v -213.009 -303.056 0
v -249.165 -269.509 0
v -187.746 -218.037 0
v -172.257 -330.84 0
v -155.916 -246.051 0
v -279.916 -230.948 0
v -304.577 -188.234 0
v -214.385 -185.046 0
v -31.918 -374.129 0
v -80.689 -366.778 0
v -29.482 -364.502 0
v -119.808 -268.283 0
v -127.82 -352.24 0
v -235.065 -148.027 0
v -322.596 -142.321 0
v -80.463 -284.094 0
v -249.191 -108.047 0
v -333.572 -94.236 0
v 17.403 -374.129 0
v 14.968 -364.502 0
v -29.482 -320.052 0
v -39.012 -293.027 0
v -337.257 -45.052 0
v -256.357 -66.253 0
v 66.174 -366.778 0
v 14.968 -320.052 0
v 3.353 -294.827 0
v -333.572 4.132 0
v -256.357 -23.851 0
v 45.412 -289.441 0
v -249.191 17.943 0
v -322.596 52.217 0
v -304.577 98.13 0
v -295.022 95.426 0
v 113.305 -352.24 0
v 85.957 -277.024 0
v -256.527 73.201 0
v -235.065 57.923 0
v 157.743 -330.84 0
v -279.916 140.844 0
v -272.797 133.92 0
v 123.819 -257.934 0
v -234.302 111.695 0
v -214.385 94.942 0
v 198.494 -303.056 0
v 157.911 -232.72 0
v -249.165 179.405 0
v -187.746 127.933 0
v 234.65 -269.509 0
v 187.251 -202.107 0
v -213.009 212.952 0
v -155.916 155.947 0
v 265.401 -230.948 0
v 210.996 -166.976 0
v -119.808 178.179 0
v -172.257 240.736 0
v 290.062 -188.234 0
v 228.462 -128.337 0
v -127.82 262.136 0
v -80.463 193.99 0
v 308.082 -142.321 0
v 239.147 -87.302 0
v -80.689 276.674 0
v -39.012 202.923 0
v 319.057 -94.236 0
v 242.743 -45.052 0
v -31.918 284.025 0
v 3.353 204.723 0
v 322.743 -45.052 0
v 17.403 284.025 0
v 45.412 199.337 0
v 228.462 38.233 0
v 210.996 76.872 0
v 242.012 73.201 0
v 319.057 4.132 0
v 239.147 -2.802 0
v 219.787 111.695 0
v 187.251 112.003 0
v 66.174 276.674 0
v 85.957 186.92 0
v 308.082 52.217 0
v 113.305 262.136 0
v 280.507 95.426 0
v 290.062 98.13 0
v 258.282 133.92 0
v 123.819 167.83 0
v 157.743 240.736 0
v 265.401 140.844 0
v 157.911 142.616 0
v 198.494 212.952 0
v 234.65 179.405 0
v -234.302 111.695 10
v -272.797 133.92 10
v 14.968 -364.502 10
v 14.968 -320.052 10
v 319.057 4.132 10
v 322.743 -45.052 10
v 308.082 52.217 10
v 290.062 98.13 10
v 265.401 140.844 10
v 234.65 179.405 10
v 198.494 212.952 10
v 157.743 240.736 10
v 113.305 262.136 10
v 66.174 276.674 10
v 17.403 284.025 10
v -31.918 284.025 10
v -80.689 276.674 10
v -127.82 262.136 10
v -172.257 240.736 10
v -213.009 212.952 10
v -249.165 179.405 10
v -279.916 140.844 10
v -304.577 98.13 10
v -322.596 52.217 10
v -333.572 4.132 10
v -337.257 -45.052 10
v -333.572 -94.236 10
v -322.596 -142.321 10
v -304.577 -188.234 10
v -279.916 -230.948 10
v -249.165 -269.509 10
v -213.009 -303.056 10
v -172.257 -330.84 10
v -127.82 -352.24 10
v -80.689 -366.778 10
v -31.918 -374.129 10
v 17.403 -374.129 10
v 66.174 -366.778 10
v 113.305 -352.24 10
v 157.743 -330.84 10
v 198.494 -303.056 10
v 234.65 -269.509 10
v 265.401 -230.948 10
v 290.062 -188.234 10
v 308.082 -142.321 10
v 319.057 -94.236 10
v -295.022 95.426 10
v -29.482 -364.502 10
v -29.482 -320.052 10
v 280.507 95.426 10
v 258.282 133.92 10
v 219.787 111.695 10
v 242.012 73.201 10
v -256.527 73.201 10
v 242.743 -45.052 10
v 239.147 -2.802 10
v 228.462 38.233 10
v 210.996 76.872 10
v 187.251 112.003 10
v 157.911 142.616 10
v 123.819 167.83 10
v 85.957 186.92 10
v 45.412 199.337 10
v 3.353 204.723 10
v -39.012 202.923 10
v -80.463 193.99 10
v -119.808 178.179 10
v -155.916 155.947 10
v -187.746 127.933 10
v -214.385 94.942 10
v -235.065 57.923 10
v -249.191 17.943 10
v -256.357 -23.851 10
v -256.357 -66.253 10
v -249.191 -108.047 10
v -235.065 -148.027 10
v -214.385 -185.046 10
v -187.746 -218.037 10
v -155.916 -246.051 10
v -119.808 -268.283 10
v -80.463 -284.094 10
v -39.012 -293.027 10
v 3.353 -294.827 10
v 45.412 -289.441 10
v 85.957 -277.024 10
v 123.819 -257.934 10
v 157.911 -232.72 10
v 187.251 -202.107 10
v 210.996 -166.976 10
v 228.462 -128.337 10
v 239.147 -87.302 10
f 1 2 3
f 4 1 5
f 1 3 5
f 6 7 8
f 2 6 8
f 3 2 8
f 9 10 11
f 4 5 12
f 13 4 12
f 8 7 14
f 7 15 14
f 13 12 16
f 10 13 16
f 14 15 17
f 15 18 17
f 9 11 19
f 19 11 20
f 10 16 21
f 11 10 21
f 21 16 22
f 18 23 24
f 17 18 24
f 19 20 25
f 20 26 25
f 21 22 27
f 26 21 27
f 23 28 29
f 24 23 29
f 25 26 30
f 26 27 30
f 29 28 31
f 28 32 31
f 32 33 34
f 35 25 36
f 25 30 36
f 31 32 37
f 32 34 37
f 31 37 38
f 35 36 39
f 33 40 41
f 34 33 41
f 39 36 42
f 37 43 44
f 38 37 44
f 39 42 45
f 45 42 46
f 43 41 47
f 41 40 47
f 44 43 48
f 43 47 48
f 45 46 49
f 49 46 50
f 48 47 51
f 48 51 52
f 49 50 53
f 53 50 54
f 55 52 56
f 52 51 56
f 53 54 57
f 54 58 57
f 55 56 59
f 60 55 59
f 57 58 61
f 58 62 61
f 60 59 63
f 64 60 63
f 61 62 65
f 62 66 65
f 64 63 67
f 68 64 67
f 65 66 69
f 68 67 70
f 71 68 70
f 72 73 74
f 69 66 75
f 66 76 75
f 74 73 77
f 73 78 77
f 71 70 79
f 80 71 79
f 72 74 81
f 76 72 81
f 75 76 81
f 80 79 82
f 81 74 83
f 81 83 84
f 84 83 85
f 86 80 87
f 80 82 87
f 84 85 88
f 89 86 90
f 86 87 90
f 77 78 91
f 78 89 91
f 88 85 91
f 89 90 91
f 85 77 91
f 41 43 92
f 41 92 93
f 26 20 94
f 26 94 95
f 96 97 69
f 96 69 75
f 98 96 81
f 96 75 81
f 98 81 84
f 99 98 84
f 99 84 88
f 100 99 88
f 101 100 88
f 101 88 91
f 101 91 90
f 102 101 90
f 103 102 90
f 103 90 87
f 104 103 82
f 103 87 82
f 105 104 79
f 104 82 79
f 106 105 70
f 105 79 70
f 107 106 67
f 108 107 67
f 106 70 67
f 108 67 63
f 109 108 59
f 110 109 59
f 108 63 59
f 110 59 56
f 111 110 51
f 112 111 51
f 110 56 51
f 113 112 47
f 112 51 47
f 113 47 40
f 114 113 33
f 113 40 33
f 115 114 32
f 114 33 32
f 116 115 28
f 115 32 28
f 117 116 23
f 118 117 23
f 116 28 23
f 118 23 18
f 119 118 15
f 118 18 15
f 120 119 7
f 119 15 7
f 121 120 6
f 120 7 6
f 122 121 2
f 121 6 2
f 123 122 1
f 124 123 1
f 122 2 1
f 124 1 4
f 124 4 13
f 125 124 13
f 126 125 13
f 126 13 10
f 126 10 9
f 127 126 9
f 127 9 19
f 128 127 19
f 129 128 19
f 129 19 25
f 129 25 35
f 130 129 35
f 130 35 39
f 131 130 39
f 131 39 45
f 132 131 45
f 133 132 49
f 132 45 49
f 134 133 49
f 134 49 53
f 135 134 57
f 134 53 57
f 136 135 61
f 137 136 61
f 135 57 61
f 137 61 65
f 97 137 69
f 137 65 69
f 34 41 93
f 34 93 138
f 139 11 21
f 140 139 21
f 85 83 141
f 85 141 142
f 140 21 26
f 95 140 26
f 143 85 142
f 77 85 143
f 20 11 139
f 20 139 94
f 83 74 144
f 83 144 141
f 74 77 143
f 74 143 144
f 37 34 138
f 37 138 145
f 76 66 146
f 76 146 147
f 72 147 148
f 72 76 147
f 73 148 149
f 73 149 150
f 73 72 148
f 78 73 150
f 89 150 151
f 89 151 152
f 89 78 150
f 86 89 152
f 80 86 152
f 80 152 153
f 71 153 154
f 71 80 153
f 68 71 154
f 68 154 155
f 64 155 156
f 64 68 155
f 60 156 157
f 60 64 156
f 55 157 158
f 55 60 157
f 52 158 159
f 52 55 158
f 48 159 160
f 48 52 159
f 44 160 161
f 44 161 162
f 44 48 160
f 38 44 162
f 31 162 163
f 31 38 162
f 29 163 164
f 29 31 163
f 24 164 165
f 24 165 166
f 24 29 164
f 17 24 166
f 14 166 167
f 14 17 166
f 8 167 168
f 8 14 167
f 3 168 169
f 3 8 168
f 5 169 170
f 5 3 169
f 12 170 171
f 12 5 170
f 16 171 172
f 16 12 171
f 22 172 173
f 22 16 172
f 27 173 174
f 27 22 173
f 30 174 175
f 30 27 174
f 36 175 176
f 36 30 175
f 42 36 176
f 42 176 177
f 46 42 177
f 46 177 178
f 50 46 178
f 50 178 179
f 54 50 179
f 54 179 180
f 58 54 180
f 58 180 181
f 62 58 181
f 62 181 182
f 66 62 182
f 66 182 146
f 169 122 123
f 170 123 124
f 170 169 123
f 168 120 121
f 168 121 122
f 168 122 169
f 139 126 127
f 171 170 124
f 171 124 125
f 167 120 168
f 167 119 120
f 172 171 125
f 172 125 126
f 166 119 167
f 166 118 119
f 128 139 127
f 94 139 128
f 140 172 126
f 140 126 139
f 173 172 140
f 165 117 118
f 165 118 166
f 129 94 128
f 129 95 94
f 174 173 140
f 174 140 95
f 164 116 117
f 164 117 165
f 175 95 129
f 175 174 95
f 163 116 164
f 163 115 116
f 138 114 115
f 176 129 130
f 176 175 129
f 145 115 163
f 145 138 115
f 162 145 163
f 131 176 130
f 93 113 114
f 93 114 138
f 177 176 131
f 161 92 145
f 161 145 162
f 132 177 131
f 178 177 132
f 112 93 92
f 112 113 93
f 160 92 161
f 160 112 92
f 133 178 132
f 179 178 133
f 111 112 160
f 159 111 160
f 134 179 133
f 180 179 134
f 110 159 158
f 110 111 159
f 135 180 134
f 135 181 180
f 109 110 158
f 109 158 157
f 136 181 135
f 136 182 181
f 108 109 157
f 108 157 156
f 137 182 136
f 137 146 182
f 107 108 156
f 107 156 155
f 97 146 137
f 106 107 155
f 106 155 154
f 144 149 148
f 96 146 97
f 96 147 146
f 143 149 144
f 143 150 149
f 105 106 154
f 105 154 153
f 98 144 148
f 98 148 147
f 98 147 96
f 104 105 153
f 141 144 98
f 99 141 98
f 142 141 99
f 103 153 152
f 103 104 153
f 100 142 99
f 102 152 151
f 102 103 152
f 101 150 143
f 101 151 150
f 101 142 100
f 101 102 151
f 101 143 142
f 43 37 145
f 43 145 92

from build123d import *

# Parameters (mm, degrees)
SKETCH2_R           = 330
SKETCH2_R_2         = 250
SKETCH2_W           = 44.45
SKETCH2_H           = 44.45
BOSS_EXTRUDE1_DEPTH = 10


with BuildPart() as part:
    # Sketch2 → Boss-Extrude1 (new body)
    with BuildSketch(Plane.XY):
        with Locations((-7.257473883, -45.051995239)):
            Circle(SKETCH2_R)
        with Locations((-7.257473883, -45.051995239)):
            Circle(SKETCH2_R_2, mode=Mode.SUBTRACT)
        Polygon((-272.796789122, 133.92041936), (-295.021789122, 95.425590162), (-256.526959924, 73.200590162), (-234.301959924, 111.69541936), align=None, mode=Mode.SUBTRACT)
        Polygon((258.281841356, 133.92041936), (219.787012158, 111.69541936), (242.012012158, 73.200590162), (280.506841356, 95.425590162), align=None, mode=Mode.SUBTRACT)
        with Locations((-7.257473883, -342.276995239)):
            Rectangle(SKETCH2_W, SKETCH2_H, mode=Mode.SUBTRACT)
    extrude(amount=BOSS_EXTRUDE1_DEPTH)


solid = part.part
